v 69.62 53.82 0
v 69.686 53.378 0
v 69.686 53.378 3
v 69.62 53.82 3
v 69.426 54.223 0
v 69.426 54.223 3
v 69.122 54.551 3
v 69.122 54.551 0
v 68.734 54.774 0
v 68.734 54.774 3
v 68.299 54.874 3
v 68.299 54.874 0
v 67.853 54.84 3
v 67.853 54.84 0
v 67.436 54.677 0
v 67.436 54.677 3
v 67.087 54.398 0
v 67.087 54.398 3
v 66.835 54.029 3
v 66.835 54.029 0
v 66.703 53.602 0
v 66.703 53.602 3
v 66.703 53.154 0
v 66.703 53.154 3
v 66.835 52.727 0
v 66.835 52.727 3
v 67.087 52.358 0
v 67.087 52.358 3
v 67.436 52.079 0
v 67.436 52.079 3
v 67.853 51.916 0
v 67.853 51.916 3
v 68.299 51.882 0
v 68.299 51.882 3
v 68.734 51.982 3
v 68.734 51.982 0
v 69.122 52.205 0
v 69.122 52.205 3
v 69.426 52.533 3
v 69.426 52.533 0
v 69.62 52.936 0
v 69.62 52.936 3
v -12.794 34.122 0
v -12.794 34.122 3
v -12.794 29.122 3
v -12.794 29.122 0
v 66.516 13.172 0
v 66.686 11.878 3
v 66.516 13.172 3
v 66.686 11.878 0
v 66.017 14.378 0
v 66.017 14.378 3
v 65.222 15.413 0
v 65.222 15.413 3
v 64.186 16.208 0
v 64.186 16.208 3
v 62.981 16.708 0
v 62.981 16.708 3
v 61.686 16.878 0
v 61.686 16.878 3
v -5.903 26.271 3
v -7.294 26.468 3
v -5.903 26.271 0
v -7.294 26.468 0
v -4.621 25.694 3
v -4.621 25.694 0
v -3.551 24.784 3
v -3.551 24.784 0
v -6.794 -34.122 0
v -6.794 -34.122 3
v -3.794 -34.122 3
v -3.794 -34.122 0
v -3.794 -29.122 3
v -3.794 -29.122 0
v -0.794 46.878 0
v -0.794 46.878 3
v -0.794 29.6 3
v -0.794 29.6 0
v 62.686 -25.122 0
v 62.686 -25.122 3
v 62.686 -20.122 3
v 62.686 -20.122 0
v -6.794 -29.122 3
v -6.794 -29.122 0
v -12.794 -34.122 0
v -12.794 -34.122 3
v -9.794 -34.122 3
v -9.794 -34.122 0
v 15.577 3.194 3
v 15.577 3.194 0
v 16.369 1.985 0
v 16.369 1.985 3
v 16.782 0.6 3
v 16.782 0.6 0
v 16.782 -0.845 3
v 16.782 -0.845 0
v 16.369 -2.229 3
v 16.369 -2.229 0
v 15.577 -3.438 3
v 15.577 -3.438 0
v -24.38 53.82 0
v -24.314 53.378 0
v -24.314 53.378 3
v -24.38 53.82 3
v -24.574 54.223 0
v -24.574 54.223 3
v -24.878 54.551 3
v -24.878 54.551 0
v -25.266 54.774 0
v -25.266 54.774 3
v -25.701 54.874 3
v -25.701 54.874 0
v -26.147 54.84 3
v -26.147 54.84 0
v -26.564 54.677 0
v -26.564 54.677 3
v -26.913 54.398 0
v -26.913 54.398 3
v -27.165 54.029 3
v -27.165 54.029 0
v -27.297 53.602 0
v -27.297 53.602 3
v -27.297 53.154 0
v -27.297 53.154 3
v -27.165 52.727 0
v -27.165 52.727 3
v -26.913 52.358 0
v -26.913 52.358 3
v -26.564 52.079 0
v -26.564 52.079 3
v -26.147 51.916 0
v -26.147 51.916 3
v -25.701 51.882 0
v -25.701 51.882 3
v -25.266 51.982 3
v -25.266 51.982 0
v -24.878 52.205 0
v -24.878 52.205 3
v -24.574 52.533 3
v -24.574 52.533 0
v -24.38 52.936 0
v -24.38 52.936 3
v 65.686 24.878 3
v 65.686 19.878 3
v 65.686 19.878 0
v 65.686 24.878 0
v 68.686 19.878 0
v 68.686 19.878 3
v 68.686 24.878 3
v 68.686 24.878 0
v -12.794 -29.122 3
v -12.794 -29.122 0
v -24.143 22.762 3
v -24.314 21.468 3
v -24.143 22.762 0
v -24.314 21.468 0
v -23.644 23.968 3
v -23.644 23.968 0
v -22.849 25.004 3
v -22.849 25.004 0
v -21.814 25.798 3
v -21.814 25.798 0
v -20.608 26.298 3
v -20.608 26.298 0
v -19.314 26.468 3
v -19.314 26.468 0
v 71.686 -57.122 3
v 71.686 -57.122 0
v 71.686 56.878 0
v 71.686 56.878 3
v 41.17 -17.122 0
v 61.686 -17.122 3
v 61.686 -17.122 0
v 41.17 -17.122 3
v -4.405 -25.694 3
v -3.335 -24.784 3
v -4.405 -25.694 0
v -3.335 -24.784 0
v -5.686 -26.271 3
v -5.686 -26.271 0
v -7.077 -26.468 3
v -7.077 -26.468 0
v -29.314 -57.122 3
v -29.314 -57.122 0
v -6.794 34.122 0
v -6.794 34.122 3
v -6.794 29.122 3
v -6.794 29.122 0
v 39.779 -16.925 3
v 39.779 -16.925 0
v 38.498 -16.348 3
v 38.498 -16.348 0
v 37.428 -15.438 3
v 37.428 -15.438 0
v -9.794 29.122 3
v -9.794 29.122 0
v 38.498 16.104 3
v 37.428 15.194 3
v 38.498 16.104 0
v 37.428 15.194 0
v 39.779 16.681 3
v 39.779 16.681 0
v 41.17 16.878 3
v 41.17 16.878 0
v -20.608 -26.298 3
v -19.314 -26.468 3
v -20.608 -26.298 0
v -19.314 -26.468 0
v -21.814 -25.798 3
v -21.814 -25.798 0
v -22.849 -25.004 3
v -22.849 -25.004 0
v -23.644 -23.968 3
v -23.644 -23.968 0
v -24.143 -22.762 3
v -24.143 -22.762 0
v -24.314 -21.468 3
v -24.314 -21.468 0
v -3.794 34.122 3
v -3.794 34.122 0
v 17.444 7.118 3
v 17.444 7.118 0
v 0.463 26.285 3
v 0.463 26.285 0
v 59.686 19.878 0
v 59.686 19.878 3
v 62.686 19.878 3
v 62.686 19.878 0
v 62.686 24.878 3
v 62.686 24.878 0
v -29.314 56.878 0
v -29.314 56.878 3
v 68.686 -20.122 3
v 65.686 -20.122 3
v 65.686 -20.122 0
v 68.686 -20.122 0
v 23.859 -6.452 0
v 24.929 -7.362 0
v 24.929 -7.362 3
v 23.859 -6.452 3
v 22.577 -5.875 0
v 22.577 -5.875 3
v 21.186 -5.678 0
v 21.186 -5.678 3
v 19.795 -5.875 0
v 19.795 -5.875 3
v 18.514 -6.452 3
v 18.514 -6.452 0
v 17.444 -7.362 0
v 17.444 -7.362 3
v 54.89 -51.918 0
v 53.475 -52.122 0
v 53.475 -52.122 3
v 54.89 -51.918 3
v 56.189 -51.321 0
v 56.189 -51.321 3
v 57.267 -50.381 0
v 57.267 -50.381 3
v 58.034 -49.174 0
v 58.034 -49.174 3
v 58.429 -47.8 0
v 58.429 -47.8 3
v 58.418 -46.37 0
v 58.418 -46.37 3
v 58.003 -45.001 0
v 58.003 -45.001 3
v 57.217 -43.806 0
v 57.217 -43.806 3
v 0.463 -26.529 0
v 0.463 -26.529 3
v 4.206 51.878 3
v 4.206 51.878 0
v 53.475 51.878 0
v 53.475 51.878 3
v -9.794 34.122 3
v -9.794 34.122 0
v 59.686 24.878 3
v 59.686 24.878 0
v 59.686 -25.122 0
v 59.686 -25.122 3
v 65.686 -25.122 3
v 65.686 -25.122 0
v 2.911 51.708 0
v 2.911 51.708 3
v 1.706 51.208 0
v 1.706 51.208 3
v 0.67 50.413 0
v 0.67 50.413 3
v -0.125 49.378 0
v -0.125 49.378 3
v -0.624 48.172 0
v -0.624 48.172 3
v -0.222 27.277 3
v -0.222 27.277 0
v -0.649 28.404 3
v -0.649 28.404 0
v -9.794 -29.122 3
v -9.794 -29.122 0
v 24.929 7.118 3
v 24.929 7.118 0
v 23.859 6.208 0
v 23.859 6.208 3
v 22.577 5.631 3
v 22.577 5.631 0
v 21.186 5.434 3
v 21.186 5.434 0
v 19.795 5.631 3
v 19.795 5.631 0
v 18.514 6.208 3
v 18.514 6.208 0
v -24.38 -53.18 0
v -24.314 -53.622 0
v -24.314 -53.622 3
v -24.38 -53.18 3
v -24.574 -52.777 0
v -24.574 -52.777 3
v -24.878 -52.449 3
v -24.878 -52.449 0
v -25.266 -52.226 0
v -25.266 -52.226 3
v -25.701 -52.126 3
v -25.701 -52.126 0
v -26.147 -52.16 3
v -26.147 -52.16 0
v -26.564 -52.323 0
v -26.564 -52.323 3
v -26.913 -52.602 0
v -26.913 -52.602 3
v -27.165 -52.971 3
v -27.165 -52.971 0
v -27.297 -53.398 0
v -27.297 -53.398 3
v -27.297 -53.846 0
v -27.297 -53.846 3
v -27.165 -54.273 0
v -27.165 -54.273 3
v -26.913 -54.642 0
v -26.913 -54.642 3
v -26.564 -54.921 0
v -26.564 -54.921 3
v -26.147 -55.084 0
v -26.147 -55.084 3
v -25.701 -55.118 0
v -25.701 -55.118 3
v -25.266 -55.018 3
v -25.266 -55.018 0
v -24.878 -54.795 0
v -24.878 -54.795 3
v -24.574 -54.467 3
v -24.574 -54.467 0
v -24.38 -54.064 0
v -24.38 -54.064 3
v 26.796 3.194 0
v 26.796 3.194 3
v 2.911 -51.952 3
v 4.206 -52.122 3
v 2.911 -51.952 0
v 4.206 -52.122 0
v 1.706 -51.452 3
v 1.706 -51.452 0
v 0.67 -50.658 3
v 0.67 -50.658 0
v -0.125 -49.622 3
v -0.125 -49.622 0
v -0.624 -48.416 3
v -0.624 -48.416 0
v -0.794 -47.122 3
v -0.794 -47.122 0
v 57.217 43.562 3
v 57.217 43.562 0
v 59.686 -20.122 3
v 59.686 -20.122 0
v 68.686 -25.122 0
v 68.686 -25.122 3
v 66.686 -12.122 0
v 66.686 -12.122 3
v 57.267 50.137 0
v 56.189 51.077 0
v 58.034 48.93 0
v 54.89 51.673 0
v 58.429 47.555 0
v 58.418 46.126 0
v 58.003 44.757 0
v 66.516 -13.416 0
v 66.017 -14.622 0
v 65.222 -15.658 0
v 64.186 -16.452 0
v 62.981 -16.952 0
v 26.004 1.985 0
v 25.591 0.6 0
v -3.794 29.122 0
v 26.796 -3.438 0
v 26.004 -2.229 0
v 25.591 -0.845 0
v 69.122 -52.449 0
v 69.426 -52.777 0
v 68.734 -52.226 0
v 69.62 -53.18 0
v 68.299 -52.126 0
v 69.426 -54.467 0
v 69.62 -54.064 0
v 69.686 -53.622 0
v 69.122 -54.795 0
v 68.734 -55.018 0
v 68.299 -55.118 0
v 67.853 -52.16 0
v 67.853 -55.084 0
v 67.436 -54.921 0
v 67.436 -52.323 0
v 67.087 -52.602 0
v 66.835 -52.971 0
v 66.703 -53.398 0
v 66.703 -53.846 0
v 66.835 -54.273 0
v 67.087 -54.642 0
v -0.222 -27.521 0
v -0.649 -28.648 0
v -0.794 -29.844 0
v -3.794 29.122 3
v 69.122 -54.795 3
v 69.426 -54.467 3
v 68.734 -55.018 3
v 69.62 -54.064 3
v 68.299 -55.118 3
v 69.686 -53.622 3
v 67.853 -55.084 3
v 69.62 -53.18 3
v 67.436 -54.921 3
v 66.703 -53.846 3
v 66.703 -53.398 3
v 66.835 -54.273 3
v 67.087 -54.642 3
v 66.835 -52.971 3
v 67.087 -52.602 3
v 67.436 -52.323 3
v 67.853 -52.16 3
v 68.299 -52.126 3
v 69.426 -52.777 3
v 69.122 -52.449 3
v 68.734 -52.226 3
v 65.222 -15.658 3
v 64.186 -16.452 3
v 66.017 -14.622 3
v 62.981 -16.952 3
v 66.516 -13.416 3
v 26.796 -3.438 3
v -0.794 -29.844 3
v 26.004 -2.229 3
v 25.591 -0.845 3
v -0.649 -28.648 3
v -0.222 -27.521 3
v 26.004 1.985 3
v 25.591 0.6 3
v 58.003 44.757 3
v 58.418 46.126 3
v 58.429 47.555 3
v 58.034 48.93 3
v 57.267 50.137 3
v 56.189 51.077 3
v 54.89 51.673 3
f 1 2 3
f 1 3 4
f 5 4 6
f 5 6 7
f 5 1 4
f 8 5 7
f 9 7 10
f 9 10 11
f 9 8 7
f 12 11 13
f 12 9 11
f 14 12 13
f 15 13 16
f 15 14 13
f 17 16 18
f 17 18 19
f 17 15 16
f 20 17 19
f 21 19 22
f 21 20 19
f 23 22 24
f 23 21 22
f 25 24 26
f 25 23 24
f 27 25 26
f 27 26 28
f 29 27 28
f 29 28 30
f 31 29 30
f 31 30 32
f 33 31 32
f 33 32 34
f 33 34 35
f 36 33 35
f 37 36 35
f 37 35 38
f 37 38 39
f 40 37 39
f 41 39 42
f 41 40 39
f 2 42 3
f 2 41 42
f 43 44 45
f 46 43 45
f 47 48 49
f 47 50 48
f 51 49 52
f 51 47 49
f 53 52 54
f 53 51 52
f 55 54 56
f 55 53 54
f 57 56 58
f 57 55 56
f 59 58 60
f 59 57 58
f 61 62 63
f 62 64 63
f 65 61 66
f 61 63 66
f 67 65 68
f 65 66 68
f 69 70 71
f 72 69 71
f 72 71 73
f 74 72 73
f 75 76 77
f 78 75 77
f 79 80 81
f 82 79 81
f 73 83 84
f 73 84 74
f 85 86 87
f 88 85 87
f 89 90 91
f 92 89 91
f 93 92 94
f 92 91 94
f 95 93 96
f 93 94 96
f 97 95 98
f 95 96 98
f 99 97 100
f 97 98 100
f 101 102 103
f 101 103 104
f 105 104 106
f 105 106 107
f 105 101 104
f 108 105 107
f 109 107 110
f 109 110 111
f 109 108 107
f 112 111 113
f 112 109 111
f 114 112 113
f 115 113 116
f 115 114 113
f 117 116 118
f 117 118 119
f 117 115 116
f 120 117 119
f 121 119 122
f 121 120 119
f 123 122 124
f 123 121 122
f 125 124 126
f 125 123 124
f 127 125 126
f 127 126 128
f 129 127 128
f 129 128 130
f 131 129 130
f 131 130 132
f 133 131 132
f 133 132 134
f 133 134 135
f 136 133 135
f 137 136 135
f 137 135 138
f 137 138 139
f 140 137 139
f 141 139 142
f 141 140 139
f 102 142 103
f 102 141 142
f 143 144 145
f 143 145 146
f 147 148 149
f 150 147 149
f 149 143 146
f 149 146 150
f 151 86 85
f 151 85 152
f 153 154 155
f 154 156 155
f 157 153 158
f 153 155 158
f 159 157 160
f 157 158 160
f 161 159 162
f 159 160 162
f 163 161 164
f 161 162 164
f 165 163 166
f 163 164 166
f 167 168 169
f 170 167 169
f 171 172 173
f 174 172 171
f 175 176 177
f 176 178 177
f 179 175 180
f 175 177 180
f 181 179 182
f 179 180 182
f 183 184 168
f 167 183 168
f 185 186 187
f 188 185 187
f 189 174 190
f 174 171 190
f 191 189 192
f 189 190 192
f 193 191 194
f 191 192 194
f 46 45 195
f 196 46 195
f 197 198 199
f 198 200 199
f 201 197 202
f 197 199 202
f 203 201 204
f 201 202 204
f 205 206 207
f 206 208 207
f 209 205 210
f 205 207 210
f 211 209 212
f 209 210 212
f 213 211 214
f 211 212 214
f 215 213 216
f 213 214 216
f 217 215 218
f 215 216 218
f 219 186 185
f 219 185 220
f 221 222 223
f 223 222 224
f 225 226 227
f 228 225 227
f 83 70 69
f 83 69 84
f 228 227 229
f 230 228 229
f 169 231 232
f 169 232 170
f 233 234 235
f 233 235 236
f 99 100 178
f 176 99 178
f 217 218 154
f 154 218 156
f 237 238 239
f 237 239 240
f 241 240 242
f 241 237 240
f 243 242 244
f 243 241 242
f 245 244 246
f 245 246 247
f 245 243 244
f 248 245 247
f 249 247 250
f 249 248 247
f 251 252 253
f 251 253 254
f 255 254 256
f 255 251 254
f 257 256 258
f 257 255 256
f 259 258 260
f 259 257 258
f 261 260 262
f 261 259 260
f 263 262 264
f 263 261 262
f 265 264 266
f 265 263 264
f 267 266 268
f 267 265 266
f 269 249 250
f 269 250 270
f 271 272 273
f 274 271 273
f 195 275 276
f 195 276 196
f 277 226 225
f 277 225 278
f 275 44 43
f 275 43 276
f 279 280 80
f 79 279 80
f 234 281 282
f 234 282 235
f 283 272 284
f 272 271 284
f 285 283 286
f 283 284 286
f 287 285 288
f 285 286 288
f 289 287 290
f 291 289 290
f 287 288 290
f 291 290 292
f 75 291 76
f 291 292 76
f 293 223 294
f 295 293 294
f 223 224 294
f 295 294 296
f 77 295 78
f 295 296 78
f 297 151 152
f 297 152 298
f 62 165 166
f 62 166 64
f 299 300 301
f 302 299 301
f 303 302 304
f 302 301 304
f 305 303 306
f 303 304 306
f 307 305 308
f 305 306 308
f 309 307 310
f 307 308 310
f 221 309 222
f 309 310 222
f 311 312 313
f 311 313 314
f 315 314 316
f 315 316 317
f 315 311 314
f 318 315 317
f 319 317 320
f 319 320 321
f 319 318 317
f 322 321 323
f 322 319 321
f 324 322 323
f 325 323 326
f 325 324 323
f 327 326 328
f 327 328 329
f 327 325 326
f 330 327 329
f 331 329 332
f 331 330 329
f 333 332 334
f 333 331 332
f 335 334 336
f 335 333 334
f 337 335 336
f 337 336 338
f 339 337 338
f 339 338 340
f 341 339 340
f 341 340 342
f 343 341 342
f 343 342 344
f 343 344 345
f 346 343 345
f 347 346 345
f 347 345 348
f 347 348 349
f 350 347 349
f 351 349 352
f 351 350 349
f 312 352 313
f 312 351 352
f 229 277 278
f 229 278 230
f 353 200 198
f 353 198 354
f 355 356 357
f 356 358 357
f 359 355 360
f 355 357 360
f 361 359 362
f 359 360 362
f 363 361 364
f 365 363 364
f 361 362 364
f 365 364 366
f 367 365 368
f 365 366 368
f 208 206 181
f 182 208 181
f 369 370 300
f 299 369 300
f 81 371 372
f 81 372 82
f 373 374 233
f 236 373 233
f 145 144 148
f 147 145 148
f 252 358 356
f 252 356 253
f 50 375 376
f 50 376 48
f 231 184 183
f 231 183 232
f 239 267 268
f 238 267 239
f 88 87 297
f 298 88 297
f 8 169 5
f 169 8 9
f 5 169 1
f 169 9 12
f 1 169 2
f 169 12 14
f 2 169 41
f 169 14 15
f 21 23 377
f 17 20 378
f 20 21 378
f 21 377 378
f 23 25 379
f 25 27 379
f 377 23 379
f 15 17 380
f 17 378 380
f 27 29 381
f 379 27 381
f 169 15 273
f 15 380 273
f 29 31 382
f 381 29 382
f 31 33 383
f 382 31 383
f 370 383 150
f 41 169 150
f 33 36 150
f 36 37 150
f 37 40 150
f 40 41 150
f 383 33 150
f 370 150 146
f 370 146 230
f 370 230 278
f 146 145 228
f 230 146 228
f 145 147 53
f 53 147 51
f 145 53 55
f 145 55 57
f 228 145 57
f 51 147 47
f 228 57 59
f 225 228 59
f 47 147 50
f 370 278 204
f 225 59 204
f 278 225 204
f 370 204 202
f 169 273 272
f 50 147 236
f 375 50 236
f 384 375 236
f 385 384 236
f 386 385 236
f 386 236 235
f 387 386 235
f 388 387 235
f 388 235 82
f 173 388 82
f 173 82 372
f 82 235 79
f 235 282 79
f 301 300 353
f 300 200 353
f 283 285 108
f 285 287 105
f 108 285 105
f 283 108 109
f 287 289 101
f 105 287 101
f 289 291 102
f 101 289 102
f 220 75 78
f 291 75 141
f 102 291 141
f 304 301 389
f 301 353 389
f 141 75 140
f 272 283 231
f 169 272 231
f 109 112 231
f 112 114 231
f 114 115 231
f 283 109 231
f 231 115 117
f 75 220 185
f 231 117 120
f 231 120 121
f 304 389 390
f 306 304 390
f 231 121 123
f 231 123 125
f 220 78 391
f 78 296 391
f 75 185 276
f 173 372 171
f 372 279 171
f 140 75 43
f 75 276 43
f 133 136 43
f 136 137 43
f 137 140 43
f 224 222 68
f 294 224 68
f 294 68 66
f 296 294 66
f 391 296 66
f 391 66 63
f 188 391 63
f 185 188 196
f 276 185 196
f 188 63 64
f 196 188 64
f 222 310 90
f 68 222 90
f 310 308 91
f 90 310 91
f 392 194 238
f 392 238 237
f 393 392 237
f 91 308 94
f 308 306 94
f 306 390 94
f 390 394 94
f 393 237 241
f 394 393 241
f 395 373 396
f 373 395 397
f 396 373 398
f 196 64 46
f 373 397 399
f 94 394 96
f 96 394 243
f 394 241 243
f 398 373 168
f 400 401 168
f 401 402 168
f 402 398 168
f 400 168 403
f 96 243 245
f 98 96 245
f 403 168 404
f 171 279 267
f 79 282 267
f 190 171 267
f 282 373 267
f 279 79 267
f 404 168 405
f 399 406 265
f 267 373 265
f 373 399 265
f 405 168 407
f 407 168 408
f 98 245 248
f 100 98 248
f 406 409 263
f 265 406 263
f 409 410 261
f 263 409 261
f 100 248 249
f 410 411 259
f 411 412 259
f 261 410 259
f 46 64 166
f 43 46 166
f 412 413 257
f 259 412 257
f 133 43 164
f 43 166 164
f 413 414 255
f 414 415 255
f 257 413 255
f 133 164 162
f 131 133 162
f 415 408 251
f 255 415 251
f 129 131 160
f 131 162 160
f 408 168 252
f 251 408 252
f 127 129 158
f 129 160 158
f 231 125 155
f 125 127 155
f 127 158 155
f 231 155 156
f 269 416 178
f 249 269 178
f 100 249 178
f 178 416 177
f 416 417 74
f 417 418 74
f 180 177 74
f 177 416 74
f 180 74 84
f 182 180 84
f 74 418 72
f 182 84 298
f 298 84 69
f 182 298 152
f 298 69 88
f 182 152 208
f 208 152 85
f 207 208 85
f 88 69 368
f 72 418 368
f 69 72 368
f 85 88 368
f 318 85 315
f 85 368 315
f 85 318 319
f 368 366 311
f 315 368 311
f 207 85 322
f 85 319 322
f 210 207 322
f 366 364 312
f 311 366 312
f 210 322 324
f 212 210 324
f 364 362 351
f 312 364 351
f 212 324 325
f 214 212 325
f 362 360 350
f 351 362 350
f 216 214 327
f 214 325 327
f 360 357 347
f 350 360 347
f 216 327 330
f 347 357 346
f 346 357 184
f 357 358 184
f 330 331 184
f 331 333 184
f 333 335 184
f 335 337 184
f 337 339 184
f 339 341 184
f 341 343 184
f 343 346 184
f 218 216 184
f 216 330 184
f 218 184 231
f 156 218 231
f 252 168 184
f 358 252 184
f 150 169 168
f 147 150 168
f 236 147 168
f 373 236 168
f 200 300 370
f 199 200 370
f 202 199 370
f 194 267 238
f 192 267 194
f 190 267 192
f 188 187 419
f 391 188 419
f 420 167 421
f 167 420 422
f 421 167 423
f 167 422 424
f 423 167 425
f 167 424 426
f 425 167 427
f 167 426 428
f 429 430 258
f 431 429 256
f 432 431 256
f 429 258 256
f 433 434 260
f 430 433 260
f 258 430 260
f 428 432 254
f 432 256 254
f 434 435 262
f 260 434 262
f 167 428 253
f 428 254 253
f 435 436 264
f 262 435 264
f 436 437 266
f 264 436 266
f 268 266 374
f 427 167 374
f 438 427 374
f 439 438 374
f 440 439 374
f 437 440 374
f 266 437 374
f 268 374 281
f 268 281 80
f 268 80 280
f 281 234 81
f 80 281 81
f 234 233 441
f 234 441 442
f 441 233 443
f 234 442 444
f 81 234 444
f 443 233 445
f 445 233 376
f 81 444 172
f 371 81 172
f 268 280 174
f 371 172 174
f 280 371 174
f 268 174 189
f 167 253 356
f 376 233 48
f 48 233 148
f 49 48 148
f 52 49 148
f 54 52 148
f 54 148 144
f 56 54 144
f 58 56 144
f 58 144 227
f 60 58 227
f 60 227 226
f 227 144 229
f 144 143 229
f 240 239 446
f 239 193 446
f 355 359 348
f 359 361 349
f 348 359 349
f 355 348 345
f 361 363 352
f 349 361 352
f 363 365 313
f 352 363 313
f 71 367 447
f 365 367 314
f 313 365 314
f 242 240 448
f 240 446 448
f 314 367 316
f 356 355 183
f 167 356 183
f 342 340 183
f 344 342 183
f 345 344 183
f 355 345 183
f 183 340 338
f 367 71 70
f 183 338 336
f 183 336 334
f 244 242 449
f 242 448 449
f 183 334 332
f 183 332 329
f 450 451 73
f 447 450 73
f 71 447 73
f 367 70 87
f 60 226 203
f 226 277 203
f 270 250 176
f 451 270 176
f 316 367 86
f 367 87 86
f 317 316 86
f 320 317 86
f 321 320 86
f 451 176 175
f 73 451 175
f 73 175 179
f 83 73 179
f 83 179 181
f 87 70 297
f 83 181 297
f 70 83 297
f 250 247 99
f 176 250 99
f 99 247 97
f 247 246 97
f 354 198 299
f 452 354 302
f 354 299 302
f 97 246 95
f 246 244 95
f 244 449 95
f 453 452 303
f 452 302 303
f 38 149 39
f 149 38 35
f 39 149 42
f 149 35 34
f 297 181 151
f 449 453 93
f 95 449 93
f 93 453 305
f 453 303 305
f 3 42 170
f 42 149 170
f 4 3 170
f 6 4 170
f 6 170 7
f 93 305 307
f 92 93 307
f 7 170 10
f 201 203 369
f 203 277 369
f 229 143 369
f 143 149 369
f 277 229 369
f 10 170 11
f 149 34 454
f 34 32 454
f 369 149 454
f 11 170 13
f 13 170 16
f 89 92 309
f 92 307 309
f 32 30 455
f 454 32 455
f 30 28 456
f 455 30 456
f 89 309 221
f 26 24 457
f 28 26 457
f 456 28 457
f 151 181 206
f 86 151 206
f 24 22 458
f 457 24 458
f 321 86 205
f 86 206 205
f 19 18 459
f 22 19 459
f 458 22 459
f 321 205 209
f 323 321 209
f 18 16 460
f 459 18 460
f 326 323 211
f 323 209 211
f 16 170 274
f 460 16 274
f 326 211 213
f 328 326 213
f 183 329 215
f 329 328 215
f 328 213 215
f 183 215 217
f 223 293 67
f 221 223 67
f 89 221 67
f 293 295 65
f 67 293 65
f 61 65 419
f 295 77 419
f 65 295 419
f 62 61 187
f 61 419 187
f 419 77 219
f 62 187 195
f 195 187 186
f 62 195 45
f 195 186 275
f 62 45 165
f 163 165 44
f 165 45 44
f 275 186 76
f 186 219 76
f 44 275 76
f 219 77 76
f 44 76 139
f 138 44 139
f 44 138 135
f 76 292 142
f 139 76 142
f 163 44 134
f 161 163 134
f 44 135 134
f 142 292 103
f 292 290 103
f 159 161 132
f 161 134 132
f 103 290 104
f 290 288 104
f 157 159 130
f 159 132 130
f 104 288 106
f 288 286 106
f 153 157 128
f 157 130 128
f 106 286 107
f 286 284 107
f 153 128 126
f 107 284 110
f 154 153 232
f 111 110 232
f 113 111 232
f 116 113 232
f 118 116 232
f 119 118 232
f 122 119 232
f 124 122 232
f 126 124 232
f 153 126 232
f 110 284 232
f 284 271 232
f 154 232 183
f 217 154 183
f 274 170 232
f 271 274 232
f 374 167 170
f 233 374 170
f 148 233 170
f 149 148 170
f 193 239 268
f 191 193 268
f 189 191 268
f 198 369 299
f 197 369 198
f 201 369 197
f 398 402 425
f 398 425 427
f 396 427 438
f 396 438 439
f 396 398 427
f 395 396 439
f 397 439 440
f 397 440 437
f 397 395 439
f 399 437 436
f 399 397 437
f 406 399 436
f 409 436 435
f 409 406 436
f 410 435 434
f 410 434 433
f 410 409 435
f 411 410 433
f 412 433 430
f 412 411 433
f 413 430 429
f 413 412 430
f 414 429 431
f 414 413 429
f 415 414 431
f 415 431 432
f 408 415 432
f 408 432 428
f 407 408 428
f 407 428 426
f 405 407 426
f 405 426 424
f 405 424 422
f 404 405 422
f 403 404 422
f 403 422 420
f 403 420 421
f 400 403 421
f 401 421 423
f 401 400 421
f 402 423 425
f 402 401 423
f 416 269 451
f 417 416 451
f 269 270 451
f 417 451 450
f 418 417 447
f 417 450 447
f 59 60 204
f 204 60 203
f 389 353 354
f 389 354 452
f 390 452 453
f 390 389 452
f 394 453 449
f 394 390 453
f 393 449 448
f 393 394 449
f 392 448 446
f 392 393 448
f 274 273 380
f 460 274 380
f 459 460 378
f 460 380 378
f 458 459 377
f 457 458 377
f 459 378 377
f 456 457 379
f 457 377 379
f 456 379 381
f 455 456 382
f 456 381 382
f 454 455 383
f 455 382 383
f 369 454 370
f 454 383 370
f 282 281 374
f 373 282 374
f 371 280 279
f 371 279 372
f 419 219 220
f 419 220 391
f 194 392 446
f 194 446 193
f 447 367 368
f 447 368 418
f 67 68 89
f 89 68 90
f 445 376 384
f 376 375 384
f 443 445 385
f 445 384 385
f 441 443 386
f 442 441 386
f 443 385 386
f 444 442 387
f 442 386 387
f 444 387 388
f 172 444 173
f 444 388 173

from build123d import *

# Parameters (mm, degrees)
SKETCH1_R           = 1.5
BOSS_EXTRUDE1_DEPTH = 3
SKETCH2_W           = 3
SKETCH2_H           = 5
BOSS_EXTRUDE2_DEPTH = 3
SKETCH2_2_W         = 3
SKETCH2_2_H         = 5
SKETCH2_2_W_2       = 2
CUT_EXTRUDE1_DEPTH  = 3
SKETCH3_W           = 3
SKETCH3_H           = 5
BOSS_EXTRUDE3_DEPTH = 3
SKETCH3_2_W         = 3
SKETCH3_2_H         = 5
CUT_EXTRUDE2_DEPTH  = 3
FILLET4_R           = 5


with BuildPart() as part:
    # Sketch1 → Boss-Extrude1 (new body)
    with BuildSketch(Plane.XY):
        Polygon((71.686424942, 53.861993355), (71.686424942, 56.877946104), (69.01439663, 56.877946104), (-29.313575058, 56.877946104), (-29.313575058, -54.106101147), (-29.313575058, -57.122053896), (-26.641546745, -57.122053896), (69.01439663, -57.122053896), (71.686424942, -57.122053896), (71.686424942, -54.106101147), align=None)
        with Locations((-25.813575058, -53.622053896)):
            Circle(SKETCH1_R, mode=Mode.SUBTRACT)
        with BuildLine():
            Line((53.474676725, -52.122053896), (-11.101826841, -52.122053896))
            ThreePointArc((-11.101826841, -52.122053896), (-15.66135034, -49.174063999), (-14.844302156, -43.806352082))
            Line((-14.844302156, -43.806352082), (17.443949627, -7.362186703))
            ThreePointArc((17.443949627, -7.362186703), (21.186424942, -5.677888517), (24.928900257, -7.362186703))
            Line((24.928900257, -7.362186703), (57.21715204, -43.806352082))
            ThreePointArc((57.21715204, -43.806352082), (58.034200224, -49.174063999), (53.474676725, -52.122053896))
        make_face(mode=Mode.SUBTRACT)
        with Locations((68.186424942, -53.622053896)):
            Circle(SKETCH1_R, mode=Mode.SUBTRACT)
        with BuildLine():
            ThreePointArc((-15.571099743, -38.594792376), (-21.086654783, -39.954150806), (-24.313575058, -35.279090562))
            Line((-24.313575058, -35.279090562), (-24.313575058, 35.03498277))
            ThreePointArc((-24.313575058, 35.03498277), (-21.086654783, 39.710043015), (-15.571099743, 38.350684584))
            Line((-15.571099743, 38.350684584), (15.576801163, 3.193647918))
            ThreePointArc((15.576801163, 3.193647918), (16.834325848, -0.122053896), (15.576801163, -3.43775571))
            Line((15.576801163, -3.43775571), (-15.571099743, -38.594792376))
        make_face(mode=Mode.SUBTRACT)
        with Locations((-25.813575058, 53.377946104)):
            Circle(SKETCH1_R, mode=Mode.SUBTRACT)
        with BuildLine():
            Line((66.686424942, 35.03498277), (66.686424942, -35.279090562))
            ThreePointArc((66.686424942, -35.279090562), (63.459504668, -39.954150806), (57.943949627, -38.594792376))
            Line((57.943949627, -38.594792376), (26.796048721, -3.43775571))
            ThreePointArc((26.796048721, -3.43775571), (25.538524036, -0.122053896), (26.796048721, 3.193647918))
            Line((26.796048721, 3.193647918), (57.943949627, 38.350684584))
            ThreePointArc((57.943949627, 38.350684584), (63.459504668, 39.710043015), (66.686424942, 35.03498277))
        make_face(mode=Mode.SUBTRACT)
        with BuildLine():
            ThreePointArc((-14.844302156, 43.56224429), (-15.66135034, 48.929956208), (-11.101826841, 51.877946104))
            Line((-11.101826841, 51.877946104), (53.474676725, 51.877946104))
            ThreePointArc((53.474676725, 51.877946104), (58.034200224, 48.929956208), (57.21715204, 43.56224429))
            Line((57.21715204, 43.56224429), (24.928900257, 7.118078911))
            ThreePointArc((24.928900257, 7.118078911), (21.186424942, 5.433780725), (17.443949627, 7.118078911))
            Line((17.443949627, 7.118078911), (-14.844302156, 43.56224429))
        make_face(mode=Mode.SUBTRACT)
        with Locations((68.186424942, 53.377946104)):
            Circle(SKETCH1_R, mode=Mode.SUBTRACT)
    extrude(amount=BOSS_EXTRUDE1_DEPTH)

    # Sketch2 → Boss-Extrude2 (add)
    # profile 1 of 2: a face of its own
    with BuildSketch(Plane.XY.offset(3)):
        Polygon((69.525635116, 16.877946104), (38.919856763, 16.877946104), (69.525635116, 52.236469223), align=None)
        with Locations((67.186424942, 22.377946104)):
            Rectangle(SKETCH2_W, SKETCH2_H, mode=Mode.SUBTRACT)
        with Locations((61.186424942, 22.377946104)):
            Rectangle(SKETCH2_W, SKETCH2_H, mode=Mode.SUBTRACT)
    # profile 2 of 2: a face of its own
    with BuildSketch(Plane.XY.offset(3)):
        Polygon((69.539183497, -17.122053896), (38.919856763, -17.122053896), (69.539183497, -51.682482091), align=None)
        with Locations((67.186424942, -22.622053896)):
            Rectangle(SKETCH2_W, SKETCH2_H, mode=Mode.SUBTRACT)
        with Locations((61.186424942, -22.622053896)):
            Rectangle(SKETCH2_W, SKETCH2_H, mode=Mode.SUBTRACT)
    extrude(amount=-BOSS_EXTRUDE2_DEPTH)

    # Sketch2<2> → Cut-Extrude1 (cut)
    with BuildSketch(Plane.XY.offset(3)):
        with Locations((67.186424942, -22.622053896)):
            Rectangle(SKETCH2_2_W, SKETCH2_2_H)
        with Locations((67.686424942, 22.377946104)):
            Rectangle(SKETCH2_2_W_2, SKETCH2_2_H)
    extrude(amount=-CUT_EXTRUDE1_DEPTH, mode=Mode.SUBTRACT)

    # Sketch3 → Boss-Extrude3 (add)
    with BuildSketch(Plane.XY.offset(3)):
        Polygon((-0.794496608, -27.948155721), (-0.794496608, -52.122053896), (-24.313575058, -52.122053896), (-24.313575058, -26.468030189), (-0.794496608, -26.468030189), align=None)
        with Locations((-11.294496608, -31.622053896)):
            Rectangle(SKETCH3_W, SKETCH3_H, mode=Mode.SUBTRACT)
        with Locations((-5.294496608, -31.622053896)):
            Rectangle(SKETCH3_W, SKETCH3_H, mode=Mode.SUBTRACT)
    boss_extrude3 = extrude(amount=-BOSS_EXTRUDE3_DEPTH)

    # Sketch3<2> → Cut-Extrude2 (cut)
    with BuildSketch(Plane.XY.offset(3)):
        with Locations((-11.294496608, -31.622053896)):
            Rectangle(SKETCH3_2_W, SKETCH3_2_H)
        with Locations((-5.294496608, -31.622053896)):
            Rectangle(SKETCH3_2_W, SKETCH3_2_H)
    cut_extrude2 = extrude(amount=-CUT_EXTRUDE2_DEPTH, mode=Mode.SUBTRACT)

    # Mirror1: Boss-Extrude3, Cut-Extrude2 across plane
    add(boss_extrude3.mirror(Plane.ZX))
    add(cut_extrude2.mirror(Plane.ZX), mode=Mode.SUBTRACT)

    # Fillet4
    fillet4_edges = [part.edges().sort_by_distance(p)[0] for p in [
        (-4.827213946, -26.468030189, 1.5),
        (-24.313575058, -26.468030189, 1.5),
        (-0.794496608, -52.122053896, 1.5),
        (-0.794496608, -27.948155721, 1.5),
        (-0.794496608, 51.877946104, 1.5),
        (-0.794496608, 27.70404793, 1.5),
        (-24.313575058, 26.468030189, 1.5),
        (-5.043484884, 26.468030189, 1.5),
        (38.919856763, 16.877946104, 1.5),
        (66.686424942, 16.877946104, 1.5),
        (66.686424942, -17.122053896, 1.5),
        (38.919856763, -17.122053896, 1.5),
    ]]
    fillet(fillet4_edges, radius=FILLET4_R)


solid = part.part
